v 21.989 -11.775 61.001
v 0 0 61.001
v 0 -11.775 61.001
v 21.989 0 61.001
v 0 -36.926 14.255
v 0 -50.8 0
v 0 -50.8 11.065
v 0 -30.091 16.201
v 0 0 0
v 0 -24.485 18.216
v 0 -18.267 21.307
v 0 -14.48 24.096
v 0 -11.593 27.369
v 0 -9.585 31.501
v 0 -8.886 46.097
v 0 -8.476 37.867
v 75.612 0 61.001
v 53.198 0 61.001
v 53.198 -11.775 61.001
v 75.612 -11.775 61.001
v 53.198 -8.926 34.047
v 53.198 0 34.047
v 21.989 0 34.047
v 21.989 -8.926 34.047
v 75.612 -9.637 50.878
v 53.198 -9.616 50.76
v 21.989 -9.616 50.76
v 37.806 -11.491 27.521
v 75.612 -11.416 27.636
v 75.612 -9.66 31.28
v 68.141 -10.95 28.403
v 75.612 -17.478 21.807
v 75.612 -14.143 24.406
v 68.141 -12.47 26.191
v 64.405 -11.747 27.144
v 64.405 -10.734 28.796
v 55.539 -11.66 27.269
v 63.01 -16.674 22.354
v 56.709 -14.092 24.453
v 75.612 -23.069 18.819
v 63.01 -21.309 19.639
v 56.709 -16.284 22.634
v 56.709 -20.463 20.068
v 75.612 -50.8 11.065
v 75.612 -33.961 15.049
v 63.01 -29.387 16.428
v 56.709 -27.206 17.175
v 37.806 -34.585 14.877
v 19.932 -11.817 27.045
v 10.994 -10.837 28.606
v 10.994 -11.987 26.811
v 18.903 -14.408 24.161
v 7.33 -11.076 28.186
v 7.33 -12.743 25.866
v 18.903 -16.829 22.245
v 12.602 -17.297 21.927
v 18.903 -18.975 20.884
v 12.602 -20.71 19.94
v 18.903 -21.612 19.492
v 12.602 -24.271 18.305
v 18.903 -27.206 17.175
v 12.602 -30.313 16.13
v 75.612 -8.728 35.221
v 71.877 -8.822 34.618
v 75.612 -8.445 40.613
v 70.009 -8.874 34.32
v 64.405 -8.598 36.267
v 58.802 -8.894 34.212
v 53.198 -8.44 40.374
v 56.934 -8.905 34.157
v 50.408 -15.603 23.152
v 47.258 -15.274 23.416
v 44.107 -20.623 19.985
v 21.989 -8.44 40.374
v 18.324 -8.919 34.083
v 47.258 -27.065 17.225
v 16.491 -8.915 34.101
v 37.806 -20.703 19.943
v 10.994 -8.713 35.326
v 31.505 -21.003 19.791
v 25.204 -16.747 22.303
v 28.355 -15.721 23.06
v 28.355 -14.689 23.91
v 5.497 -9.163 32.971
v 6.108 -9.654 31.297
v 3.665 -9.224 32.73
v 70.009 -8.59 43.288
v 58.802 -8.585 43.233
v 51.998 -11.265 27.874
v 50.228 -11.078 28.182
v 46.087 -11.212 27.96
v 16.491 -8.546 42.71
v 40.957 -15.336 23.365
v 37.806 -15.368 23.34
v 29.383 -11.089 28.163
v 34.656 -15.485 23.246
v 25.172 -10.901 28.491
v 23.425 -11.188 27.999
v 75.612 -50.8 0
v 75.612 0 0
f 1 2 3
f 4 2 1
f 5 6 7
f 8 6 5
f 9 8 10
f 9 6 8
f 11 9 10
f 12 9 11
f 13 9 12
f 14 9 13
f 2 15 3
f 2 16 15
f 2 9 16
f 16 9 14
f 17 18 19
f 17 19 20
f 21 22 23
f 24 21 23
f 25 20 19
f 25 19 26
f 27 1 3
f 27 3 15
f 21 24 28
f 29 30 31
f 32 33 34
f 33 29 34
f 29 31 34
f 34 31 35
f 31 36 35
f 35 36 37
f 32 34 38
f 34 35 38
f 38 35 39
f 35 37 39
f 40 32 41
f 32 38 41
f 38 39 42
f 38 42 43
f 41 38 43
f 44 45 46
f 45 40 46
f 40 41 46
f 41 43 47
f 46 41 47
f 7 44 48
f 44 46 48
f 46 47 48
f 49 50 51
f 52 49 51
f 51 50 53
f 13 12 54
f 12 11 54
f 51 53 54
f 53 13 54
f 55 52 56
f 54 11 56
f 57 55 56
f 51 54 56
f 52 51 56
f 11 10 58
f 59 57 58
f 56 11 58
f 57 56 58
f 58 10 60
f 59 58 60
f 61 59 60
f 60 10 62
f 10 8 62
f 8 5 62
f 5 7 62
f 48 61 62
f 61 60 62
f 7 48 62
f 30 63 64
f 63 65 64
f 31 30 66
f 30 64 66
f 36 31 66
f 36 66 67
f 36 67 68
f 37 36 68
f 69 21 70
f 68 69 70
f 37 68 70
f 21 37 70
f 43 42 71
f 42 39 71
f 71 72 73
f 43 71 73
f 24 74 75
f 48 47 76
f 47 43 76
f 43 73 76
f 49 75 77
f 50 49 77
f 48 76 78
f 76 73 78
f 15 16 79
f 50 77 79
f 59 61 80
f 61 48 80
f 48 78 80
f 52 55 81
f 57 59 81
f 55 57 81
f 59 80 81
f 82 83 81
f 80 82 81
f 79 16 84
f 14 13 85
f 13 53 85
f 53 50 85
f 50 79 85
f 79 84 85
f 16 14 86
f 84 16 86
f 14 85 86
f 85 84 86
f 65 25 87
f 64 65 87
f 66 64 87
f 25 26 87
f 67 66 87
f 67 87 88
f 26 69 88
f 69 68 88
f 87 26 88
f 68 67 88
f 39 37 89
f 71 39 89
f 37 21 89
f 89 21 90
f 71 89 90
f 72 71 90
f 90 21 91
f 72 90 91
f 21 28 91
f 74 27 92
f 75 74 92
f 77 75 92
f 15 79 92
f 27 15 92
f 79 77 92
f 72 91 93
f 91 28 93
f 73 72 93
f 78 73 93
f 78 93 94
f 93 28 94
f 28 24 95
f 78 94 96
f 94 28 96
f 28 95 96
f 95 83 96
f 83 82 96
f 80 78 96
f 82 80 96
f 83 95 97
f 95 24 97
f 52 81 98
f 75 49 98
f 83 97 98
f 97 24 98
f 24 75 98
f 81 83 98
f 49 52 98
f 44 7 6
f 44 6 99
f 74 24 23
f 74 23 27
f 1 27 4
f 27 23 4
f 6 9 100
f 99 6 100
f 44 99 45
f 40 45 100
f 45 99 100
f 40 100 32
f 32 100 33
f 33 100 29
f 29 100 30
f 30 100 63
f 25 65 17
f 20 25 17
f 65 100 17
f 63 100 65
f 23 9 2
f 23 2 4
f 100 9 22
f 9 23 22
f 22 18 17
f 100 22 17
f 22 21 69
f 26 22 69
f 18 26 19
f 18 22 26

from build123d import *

# Parameters (mm, degrees)
F0_W     = 75.6122842431
F0_H     = 61.000533402
F1_DEPTH = 50.8
F3_DEPTH = 76.2
F4_W     = 31.2095750123
F4_H     = 26.9537232816
F5_DEPTH = 25.4


with BuildPart() as f1:
    # F0 (on Front) → F1 (new body)
    with BuildSketch(Plane.XZ):
        with Locations((37.8061421216, 30.500266701)):
            Rectangle(F0_W, F0_H)
    extrude(amount=F1_DEPTH)

    # F2 (on face) → F3 (cut)
    with BuildSketch(Plane(origin=(0, 0, 0), x_dir=(0, -1, 0), z_dir=(-1, 0, 0))):
        with BuildLine():
            Line((50.8, 61.000533402), (11.7745203897, 61.000533402))
            add(Edge.make_bspline(
                [(11.7745203897, 61.000533402), (8.9290710165, 48.3611461348), (2.8734064272, 21.462094399), (34.1955670512, 14.6672699688), (50.8, 11.0652130097)],
                knots=[0, 0, 0, 0, 0.4698822617, 1, 1, 1, 1], degree=3))
            Line((50.8, 11.0652130097), (50.8, 61.000533402))
        make_face()
    extrude(amount=-F3_DEPTH, mode=Mode.SUBTRACT)

    # F4 (on face) → F5 (cut)
    with BuildSketch(Plane(origin=(0, 0, 0), x_dir=(-1, 0, 0), z_dir=(0, 1, 0))):
        with Locations((-37.5933526084, 47.5236717612)):
            Rectangle(F4_W, F4_H)
    extrude(amount=-F5_DEPTH, mode=Mode.SUBTRACT)


solid = f1.part
